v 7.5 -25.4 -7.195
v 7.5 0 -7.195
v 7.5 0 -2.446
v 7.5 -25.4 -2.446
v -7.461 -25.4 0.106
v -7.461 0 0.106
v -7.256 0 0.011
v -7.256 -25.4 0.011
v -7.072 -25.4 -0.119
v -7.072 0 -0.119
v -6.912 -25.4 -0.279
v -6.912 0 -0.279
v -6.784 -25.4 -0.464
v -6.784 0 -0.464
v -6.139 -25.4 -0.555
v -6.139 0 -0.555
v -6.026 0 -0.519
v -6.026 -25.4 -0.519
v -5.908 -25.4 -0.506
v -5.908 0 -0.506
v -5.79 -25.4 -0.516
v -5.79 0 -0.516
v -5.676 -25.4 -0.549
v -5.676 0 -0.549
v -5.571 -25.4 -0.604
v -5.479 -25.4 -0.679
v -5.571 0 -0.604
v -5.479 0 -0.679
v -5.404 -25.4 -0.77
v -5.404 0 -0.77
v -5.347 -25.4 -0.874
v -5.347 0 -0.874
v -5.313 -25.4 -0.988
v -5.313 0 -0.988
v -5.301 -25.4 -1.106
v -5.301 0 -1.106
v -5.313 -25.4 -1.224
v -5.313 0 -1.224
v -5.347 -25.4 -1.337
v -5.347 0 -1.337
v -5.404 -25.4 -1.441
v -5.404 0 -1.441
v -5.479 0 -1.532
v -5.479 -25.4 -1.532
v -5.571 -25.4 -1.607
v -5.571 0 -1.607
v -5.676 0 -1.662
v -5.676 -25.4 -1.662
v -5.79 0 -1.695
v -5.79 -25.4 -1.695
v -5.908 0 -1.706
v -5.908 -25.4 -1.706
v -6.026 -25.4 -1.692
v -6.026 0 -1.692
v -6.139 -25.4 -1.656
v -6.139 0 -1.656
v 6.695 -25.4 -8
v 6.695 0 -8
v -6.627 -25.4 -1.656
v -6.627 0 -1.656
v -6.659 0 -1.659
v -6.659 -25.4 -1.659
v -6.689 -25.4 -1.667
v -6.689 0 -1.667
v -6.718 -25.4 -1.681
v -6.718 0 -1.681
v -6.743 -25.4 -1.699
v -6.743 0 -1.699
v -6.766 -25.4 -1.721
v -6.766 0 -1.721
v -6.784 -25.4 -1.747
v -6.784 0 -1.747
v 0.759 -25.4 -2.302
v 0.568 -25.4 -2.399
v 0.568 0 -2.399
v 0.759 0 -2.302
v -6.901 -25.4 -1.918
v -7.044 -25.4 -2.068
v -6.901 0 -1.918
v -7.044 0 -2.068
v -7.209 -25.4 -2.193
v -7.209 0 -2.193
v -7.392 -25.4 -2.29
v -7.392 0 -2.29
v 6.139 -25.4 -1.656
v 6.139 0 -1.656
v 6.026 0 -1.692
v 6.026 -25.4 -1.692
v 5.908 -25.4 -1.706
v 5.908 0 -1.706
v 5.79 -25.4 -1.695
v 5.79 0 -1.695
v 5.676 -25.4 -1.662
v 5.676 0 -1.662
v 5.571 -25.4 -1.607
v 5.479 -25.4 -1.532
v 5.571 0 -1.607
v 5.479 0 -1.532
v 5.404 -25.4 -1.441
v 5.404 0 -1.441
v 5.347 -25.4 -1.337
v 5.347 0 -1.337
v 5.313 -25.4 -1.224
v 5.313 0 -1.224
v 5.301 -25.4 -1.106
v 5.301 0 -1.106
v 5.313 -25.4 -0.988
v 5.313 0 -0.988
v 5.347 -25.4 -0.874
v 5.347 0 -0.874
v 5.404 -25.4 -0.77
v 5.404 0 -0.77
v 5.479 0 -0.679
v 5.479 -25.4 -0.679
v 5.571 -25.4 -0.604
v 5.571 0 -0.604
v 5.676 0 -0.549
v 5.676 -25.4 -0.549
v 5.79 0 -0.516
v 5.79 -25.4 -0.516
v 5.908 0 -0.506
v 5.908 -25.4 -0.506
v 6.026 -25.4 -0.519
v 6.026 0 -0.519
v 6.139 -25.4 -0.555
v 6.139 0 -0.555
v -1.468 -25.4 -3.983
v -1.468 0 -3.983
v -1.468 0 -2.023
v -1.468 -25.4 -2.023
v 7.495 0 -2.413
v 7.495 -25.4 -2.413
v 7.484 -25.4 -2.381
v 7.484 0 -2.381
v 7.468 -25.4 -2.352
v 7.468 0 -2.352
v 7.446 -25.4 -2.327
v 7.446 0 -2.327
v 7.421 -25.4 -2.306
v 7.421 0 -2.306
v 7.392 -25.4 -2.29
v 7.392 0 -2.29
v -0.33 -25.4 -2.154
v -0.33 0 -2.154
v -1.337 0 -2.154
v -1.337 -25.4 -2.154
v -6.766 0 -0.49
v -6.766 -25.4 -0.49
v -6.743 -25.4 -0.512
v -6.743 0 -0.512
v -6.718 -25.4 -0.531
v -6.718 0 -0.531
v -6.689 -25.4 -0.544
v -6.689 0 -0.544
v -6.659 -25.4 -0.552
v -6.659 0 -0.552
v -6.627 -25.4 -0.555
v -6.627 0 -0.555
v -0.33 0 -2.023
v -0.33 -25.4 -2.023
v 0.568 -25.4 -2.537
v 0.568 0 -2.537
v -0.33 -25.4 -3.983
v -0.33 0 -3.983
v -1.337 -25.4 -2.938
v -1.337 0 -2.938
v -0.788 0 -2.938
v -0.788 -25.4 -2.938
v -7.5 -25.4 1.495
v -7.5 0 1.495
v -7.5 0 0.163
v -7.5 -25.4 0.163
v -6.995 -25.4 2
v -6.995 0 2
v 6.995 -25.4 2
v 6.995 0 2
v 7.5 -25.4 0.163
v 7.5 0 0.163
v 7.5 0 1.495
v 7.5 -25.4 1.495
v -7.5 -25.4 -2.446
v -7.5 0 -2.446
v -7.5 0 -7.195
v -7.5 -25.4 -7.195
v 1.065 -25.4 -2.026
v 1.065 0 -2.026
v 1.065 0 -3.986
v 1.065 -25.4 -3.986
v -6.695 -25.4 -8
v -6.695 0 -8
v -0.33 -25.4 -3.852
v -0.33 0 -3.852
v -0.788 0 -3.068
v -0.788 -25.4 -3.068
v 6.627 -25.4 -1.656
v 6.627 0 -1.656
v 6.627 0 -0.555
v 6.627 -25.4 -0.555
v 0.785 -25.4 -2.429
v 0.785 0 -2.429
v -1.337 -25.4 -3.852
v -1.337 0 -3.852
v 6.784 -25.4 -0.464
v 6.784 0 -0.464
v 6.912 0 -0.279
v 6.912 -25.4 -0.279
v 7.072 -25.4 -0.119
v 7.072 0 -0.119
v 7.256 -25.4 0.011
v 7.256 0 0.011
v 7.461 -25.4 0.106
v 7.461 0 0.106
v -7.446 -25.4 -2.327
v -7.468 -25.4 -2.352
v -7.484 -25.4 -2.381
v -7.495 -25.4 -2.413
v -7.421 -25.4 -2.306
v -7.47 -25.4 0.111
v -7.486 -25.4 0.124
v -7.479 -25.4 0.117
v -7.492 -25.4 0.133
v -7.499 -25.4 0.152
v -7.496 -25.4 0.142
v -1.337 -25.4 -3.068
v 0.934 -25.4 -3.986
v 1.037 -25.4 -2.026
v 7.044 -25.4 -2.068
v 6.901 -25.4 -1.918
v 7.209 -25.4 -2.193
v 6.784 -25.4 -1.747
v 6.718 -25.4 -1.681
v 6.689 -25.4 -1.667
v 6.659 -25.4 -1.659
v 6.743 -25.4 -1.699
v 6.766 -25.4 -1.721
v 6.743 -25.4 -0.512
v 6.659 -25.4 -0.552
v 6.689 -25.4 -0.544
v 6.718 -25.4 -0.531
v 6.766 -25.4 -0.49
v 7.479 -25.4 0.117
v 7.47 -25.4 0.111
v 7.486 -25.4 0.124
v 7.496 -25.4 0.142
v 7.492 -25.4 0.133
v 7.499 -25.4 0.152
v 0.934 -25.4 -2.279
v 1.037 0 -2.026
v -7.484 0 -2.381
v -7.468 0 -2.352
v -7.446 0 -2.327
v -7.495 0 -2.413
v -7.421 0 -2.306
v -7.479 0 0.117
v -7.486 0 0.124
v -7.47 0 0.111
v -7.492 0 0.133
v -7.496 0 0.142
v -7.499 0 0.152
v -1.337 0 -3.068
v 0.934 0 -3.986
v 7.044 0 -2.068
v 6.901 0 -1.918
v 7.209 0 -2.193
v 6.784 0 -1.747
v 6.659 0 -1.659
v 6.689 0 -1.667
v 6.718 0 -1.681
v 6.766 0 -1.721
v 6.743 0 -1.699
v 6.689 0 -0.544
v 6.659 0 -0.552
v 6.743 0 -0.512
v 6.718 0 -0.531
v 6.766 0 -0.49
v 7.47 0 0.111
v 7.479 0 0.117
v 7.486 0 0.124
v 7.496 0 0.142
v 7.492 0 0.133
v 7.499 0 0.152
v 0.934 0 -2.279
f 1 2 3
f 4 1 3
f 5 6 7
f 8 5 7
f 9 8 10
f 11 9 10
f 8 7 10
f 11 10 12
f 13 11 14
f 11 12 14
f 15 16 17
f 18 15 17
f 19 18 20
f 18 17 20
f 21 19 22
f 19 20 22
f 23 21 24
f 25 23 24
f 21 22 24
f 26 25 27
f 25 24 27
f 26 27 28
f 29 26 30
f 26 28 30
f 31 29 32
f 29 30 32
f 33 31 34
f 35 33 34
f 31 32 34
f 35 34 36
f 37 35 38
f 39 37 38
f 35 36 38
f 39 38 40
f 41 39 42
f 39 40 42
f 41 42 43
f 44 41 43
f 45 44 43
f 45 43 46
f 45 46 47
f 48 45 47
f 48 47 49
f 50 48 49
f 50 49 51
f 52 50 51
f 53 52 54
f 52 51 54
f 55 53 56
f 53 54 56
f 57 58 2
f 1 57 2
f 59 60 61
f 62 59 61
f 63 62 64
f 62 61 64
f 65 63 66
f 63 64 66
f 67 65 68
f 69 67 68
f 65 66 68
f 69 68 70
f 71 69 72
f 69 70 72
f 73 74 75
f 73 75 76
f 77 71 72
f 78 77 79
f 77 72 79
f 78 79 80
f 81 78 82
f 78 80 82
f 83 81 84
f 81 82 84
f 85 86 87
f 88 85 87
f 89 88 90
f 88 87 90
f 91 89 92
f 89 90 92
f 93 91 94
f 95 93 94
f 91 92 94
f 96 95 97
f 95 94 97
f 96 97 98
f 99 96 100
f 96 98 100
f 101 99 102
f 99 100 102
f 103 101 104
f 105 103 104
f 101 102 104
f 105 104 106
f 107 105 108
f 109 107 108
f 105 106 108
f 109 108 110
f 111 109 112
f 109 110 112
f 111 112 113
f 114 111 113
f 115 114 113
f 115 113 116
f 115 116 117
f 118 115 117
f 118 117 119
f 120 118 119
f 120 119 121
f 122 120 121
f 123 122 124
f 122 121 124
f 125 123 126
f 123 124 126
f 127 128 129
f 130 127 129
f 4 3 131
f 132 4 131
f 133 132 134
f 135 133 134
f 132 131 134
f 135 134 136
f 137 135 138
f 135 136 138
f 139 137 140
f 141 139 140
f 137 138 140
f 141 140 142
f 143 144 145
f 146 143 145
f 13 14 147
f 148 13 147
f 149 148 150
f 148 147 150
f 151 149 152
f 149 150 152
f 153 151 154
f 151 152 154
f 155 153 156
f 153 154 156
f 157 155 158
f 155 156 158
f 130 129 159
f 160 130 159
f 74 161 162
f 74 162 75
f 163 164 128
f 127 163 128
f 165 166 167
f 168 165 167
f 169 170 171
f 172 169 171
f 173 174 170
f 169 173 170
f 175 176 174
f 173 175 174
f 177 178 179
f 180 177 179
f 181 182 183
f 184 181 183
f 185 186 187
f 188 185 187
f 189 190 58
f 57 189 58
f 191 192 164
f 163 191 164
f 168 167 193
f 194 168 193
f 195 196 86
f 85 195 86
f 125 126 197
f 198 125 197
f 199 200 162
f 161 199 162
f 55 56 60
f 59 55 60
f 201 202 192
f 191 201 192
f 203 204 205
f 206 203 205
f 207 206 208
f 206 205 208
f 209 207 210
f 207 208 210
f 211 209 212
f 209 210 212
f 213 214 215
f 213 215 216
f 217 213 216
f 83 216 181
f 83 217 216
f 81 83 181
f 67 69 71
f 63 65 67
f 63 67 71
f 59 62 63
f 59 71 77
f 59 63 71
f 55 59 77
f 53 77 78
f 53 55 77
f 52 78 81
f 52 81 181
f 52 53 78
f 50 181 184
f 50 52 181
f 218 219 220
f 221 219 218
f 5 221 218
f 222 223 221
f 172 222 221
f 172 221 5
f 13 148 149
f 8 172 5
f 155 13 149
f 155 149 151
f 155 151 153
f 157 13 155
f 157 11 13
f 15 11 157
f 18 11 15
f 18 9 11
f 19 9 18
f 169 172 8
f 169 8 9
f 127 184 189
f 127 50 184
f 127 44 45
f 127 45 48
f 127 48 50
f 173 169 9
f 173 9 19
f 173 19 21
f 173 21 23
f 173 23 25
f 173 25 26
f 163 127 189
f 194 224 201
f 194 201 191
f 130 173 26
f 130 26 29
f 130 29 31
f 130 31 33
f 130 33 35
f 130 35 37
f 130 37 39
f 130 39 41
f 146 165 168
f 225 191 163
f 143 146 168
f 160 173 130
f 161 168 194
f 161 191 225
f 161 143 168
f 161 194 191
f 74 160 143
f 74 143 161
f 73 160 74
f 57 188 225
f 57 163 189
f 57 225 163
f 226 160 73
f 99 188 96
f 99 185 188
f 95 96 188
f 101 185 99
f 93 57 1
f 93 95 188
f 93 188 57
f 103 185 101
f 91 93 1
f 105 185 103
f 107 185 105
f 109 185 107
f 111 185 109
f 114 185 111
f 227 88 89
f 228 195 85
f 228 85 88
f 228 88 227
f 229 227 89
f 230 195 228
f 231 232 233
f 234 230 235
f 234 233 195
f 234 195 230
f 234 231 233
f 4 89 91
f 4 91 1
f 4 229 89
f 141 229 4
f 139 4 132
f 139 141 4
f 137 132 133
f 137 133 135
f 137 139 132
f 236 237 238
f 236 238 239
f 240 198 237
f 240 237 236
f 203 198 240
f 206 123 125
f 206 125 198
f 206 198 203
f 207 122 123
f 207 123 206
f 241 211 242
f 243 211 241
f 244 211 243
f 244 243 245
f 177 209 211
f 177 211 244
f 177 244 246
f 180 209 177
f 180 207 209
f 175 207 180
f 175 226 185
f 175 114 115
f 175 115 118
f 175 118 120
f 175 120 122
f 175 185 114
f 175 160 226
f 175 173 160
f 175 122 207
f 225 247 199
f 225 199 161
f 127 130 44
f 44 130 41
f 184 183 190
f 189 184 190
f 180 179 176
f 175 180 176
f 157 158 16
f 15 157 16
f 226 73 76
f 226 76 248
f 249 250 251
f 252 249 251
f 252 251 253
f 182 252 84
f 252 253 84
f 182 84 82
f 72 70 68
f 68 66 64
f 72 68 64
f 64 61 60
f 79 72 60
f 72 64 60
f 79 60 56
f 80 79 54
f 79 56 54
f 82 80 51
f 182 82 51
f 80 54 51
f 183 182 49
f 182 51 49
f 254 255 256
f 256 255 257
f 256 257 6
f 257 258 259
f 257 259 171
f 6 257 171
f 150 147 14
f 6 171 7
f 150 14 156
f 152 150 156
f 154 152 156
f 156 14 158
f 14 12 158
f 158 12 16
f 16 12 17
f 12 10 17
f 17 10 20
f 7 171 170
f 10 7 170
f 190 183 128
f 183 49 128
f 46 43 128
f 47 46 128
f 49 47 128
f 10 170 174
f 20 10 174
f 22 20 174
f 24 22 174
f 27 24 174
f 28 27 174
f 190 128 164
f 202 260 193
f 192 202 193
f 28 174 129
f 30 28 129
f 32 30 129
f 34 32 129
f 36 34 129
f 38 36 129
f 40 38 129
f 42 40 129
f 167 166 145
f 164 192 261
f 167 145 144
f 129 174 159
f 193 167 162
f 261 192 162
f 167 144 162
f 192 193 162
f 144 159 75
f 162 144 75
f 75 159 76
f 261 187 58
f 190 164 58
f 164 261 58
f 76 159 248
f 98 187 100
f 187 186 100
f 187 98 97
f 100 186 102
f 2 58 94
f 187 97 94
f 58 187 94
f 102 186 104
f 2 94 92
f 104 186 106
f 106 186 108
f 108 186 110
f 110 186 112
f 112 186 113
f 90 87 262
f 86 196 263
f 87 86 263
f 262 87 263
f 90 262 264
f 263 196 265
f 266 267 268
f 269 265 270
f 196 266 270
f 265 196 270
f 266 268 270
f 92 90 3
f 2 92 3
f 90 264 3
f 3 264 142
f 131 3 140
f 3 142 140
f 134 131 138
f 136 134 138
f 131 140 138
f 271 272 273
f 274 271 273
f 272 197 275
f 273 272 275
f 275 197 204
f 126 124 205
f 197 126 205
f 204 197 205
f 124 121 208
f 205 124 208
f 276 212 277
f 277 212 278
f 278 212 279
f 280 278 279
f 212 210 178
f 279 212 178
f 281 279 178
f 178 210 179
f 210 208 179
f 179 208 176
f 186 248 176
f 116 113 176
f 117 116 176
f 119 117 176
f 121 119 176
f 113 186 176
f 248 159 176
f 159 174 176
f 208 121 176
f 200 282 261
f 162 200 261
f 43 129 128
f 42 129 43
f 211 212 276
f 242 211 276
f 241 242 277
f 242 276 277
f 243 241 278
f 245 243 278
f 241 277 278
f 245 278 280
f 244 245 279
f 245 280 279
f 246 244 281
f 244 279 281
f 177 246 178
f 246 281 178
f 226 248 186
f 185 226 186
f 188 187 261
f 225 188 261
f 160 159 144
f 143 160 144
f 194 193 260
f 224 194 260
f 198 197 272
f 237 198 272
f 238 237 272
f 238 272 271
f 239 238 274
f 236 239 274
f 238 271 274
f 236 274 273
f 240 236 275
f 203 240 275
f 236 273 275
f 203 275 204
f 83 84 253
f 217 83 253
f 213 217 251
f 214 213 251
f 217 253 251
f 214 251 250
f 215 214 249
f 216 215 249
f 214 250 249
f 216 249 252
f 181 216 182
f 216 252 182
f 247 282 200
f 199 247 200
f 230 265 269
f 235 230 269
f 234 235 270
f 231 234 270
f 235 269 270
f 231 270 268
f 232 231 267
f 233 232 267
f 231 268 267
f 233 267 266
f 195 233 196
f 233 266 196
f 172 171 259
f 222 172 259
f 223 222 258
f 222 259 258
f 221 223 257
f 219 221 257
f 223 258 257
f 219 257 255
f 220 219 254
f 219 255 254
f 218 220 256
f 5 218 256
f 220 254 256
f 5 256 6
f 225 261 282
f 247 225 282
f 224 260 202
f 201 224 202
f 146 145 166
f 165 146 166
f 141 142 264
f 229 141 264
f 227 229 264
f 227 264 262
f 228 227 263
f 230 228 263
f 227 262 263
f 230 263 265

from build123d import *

# Parameters (mm, degrees)
F1_DEPTH = 25.4


# Not quite as in the source:
# - ends of sketch curves that miss each other by under 0.0002 mm in the source are joined


with BuildPart() as f1:
    # F0 (on Front) → F1 (new body)
    with BuildSketch(Plane.XZ):
        with BuildLine():
            Line((-7.5, -7.195485), (-6.695486, -8))
            Line((-6.695486, -8), (6.695486, -8))
            Line((6.695486, -8), (7.5, -7.195485))
            Line((7.5, -7.195485), (7.5, -2.445548))
            ThreePointArc((7.5, -2.445548), (7.4679364252, -2.3523462741), (7.3915955611, -2.2900030169))
            ThreePointArc((7.3915955611, -2.2900030169), (7.0435250993, -2.0677653184), (6.7835181408, -1.7469249193))
            ThreePointArc((6.7835181408, -1.7469249193), (6.7175952727, -1.6806726709), (6.627337, -1.656408))
            Line((6.627337, -1.656408), (6.138893, -1.656409))
            ThreePointArc((6.138893, -1.656409), (5.300907, -1.105625), (6.1388920414, -0.5548409043))
            Line((6.1388920414, -0.5548409043), (6.627337, -0.554841))
            ThreePointArc((6.627337, -0.554841), (6.7175947713, -0.5305764639), (6.7835185098, -0.4643247191))
            ThreePointArc((6.7835185098, -0.4643247191), (7.0715565387, -0.1191653097), (7.4605499849, 0.1061910414))
            ThreePointArc((7.4605499849, 0.1061910414), (7.4891585913, 0.1281728571), (7.5, 0.162584))
            Line((7.5, 0.162584), (7.5, 1.495485))
            Line((7.5, 1.495485), (6.995485, 2))
            Line((6.995485, 2), (-6.995485, 2))
            Line((-6.995485, 2), (-7.5, 1.495485))
            Line((-7.5, 1.495485), (-7.5, 0.162584))
            ThreePointArc((-7.5, 0.162584), (-7.489158493, 0.1281727166), (-7.460549826, 0.1061904768))
            ThreePointArc((-7.460549826, 0.1061904768), (-7.0715565387, -0.1191653097), (-6.7835181408, -0.4643250807))
            ThreePointArc((-6.7835181408, -0.4643250807), (-6.7175952727, -0.5305773291), (-6.627337, -0.554842))
            Line((-6.627337, -0.554842), (-6.138893, -0.554841))
            ThreePointArc((-6.138893, -0.554841), (-5.300907, -1.105625), (-6.1388920414, -1.6564090957))
            Line((-6.1388920414, -1.6564090957), (-6.627337, -1.656409))
            ThreePointArc((-6.627337, -1.656409), (-6.7175947713, -1.6806735361), (-6.7835185098, -1.7469252809))
            ThreePointArc((-6.7835185098, -1.7469252809), (-7.0435250993, -2.0677653184), (-7.3915951882, -2.290002564))
            ThreePointArc((-7.3915951882, -2.290002564), (-7.467936276, -2.35234606), (-7.499999532, -2.4455480253))
            Line((-7.499999532, -2.4455480253), (-7.5, -7.195485))
        make_face()
        Polygon((-0.330203, -3.983), (-1.467667, -3.983), (-1.467667, -2.023), (-0.330203, -2.023), (-0.330203, -2.153666), (-1.337, -2.153666), (-1.337, -2.937667), (-0.788302, -2.937667), (-0.788302, -3.068333), (-1.337, -3.068333), (-1.337, -3.852334), (-0.330203, -3.852334), align=None, mode=Mode.SUBTRACT)
        Polygon((1.064667, -3.985533), (0.934, -3.985533), (0.934, -2.278991), (0.784703, -2.429492), (0.567776, -2.536533), (0.567776, -2.398867), (0.759182, -2.302033), (1.037104, -2.025533), (1.064667, -2.025533), align=None, mode=Mode.SUBTRACT)
    extrude(amount=F1_DEPTH)


solid = f1.part
